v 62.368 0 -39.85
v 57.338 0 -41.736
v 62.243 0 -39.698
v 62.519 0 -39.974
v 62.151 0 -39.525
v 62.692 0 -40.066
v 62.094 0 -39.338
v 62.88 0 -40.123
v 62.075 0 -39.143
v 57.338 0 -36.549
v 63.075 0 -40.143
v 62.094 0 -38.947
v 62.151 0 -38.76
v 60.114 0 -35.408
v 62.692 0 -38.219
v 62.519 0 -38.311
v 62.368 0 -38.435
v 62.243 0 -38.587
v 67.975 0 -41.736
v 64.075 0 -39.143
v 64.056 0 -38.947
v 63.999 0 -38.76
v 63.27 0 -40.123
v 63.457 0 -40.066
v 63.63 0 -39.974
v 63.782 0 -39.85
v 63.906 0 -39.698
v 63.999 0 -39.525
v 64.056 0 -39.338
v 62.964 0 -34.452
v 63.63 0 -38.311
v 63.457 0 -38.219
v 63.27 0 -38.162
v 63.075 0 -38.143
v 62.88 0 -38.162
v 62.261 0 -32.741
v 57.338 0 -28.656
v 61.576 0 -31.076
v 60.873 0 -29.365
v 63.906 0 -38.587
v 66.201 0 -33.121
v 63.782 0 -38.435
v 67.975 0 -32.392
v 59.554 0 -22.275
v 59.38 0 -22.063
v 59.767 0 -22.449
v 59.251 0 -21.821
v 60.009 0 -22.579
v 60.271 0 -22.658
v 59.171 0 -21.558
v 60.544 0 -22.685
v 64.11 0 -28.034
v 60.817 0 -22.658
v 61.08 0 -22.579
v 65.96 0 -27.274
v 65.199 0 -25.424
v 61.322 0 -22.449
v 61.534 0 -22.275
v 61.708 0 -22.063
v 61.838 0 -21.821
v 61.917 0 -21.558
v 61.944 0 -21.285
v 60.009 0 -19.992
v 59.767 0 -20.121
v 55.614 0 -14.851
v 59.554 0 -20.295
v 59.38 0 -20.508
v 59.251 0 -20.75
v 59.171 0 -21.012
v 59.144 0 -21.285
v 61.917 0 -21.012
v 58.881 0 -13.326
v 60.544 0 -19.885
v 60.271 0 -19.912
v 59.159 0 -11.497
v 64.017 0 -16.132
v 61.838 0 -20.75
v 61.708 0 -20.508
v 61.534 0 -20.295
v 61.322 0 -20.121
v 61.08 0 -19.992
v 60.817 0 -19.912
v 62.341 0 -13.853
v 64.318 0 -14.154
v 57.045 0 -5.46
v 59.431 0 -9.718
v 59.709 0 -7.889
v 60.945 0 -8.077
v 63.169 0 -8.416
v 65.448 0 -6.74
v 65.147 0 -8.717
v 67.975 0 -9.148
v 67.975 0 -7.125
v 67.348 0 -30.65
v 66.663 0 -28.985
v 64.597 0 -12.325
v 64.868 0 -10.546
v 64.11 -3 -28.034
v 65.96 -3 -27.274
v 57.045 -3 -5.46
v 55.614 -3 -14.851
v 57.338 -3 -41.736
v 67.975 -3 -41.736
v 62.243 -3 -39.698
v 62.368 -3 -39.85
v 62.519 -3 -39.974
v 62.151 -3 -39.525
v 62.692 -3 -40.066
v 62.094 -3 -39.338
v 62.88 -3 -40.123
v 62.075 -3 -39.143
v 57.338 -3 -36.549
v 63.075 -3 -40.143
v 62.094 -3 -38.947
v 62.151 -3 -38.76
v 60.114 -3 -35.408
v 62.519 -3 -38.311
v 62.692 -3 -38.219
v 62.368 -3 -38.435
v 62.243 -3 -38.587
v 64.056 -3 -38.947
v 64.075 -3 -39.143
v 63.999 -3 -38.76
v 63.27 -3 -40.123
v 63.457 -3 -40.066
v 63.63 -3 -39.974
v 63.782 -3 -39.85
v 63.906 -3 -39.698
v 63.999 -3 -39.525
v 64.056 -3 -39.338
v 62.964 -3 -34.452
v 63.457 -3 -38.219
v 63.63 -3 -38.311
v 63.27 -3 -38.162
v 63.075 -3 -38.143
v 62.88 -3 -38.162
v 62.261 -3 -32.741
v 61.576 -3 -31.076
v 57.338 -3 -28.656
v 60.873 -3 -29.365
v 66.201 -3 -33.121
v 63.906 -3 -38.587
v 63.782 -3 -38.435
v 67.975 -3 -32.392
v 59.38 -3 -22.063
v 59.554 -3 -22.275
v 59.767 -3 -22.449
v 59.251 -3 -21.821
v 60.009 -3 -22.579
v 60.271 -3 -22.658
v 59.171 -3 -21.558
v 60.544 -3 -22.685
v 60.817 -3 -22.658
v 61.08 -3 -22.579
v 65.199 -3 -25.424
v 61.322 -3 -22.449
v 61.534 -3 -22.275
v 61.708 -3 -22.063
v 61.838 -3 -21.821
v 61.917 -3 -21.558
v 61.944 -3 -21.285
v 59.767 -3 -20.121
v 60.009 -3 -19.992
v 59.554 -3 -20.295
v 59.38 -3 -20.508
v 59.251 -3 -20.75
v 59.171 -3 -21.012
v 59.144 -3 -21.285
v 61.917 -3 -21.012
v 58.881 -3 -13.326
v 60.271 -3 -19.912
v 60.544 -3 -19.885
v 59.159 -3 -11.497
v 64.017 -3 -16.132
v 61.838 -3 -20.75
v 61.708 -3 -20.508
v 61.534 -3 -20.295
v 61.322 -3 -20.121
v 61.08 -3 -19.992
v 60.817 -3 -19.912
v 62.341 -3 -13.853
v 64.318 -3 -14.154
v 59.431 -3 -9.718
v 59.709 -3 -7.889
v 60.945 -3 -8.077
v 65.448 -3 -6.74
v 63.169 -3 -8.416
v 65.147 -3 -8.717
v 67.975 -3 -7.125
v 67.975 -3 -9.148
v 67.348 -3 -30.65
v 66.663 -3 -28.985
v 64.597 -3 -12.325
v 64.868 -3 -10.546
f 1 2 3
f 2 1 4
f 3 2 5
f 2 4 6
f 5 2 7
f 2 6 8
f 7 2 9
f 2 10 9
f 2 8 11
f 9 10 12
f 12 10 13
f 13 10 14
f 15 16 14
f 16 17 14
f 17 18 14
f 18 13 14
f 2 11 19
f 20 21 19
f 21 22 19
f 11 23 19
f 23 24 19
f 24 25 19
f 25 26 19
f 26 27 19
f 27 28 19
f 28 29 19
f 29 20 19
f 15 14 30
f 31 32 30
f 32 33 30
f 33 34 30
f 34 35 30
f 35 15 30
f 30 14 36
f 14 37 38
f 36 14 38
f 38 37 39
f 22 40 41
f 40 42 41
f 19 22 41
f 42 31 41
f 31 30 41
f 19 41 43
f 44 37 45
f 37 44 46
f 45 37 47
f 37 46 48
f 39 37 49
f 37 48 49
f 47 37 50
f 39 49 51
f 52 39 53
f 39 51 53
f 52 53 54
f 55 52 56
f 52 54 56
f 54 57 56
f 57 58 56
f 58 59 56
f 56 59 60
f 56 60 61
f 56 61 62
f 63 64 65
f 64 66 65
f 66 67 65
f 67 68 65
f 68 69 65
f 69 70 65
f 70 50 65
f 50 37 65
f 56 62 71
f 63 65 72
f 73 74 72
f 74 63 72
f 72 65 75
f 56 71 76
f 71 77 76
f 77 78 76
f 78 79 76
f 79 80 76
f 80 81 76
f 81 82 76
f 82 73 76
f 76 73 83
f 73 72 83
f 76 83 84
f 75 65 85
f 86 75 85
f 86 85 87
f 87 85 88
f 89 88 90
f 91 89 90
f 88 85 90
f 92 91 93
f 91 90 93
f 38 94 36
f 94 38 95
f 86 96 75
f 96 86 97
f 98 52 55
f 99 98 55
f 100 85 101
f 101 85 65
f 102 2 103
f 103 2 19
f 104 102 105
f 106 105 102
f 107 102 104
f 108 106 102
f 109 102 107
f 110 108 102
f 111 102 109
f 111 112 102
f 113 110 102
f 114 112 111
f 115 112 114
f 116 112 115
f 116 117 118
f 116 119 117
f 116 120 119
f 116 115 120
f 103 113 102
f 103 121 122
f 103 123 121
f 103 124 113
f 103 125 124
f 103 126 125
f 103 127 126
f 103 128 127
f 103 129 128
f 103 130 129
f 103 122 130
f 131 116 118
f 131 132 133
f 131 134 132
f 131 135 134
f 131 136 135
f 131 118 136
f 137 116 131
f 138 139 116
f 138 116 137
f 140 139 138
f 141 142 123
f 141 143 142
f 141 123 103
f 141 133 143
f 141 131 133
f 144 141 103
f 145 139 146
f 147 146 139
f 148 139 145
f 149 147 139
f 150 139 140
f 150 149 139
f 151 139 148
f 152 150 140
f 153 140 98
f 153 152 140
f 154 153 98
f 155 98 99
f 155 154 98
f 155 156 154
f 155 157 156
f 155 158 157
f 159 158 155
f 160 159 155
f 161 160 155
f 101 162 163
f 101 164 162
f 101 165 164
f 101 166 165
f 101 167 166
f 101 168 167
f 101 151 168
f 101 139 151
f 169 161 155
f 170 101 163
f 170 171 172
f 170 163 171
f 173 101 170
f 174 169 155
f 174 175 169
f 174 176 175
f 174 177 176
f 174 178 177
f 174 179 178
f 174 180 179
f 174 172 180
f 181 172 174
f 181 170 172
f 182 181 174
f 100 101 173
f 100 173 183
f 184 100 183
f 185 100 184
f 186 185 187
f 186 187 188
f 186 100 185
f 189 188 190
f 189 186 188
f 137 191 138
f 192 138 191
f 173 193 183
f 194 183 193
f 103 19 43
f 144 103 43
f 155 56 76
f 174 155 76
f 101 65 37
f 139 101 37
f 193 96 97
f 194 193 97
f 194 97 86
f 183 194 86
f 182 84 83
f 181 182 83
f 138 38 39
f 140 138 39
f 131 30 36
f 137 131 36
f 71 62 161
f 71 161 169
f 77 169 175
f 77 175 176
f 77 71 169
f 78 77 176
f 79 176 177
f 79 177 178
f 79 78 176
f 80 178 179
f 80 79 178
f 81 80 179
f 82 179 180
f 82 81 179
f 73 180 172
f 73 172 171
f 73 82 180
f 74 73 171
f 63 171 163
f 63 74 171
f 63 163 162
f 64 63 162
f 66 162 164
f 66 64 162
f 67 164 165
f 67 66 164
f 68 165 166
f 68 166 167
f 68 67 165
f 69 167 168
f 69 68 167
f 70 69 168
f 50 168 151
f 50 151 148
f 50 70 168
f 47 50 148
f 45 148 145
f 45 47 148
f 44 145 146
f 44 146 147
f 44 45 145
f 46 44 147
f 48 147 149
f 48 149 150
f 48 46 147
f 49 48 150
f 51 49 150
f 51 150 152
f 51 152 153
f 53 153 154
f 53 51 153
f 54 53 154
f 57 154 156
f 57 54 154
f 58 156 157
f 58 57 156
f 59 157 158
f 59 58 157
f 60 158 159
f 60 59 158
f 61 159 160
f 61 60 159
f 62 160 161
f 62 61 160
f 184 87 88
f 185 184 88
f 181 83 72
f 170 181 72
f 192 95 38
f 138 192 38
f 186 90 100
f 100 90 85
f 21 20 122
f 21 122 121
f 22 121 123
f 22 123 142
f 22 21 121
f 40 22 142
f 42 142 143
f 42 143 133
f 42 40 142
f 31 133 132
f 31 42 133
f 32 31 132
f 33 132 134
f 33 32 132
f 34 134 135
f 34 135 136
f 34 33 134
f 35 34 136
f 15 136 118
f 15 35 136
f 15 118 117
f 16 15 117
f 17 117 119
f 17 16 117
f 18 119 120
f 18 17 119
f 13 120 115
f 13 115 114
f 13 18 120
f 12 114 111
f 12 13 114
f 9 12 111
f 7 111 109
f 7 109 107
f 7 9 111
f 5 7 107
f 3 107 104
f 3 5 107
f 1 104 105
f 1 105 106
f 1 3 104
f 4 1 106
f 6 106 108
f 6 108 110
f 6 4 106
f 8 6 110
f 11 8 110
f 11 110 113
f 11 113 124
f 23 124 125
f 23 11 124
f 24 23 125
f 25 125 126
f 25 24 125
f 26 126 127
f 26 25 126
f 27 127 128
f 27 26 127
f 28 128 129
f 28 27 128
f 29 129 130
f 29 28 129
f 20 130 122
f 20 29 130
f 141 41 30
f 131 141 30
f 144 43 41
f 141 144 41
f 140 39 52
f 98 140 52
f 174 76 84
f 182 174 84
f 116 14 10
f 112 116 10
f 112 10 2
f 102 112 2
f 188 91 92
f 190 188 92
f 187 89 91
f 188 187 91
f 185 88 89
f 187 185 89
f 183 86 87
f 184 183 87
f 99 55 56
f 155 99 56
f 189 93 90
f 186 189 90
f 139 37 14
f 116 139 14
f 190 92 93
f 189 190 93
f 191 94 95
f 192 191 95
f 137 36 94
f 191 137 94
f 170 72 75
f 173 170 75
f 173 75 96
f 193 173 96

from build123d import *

# Parameters (mm, degrees)
F0_R     = 1
F0_R_2   = 1.4
F1_DEPTH = 3


with BuildPart() as f1:
    # F0 (on Front) → F1 (new body)
    with BuildSketch(Plane.XZ):
        Polygon((66.201438, -33.121341), (62.964357, -34.452247), (62.260879, -32.741219), (67.347719, -30.649795), (66.663254, -28.985011), (61.576413, -31.076434), (60.872934, -29.365406), (64.110014, -28.0345), (65.959775, -27.273983), (65.199257, -25.424222), (64.016773, -16.131517), (64.31804, -14.154337), (62.340861, -13.85307), (58.880797, -13.325852), (59.159469, -11.496961), (64.596712, -12.325446), (64.867853, -10.545985), (59.43061, -9.7175), (59.709282, -7.888609), (60.945019, -8.076901), (63.169346, -8.415827), (65.146525, -8.717094), (67.975146, -9.148098), (67.975146, -7.125014), (65.447792, -6.739915), (61.246286, -6.099722), (57.04478, -5.459529), (55.613761, -14.851131), (57.337776, -28.656422), (60.113665, -35.408047), (57.337776, -36.549337), (57.337776, -41.735669), (67.975146, -41.735669), (67.975146, -32.392092), align=None)
        with Locations((63.074746, -39.142503)):
            Circle(F0_R, mode=Mode.SUBTRACT)
        with Locations((60.54433, -21.285346)):
            Circle(F0_R_2, mode=Mode.SUBTRACT)
    extrude(amount=F1_DEPTH)


solid = f1.part
